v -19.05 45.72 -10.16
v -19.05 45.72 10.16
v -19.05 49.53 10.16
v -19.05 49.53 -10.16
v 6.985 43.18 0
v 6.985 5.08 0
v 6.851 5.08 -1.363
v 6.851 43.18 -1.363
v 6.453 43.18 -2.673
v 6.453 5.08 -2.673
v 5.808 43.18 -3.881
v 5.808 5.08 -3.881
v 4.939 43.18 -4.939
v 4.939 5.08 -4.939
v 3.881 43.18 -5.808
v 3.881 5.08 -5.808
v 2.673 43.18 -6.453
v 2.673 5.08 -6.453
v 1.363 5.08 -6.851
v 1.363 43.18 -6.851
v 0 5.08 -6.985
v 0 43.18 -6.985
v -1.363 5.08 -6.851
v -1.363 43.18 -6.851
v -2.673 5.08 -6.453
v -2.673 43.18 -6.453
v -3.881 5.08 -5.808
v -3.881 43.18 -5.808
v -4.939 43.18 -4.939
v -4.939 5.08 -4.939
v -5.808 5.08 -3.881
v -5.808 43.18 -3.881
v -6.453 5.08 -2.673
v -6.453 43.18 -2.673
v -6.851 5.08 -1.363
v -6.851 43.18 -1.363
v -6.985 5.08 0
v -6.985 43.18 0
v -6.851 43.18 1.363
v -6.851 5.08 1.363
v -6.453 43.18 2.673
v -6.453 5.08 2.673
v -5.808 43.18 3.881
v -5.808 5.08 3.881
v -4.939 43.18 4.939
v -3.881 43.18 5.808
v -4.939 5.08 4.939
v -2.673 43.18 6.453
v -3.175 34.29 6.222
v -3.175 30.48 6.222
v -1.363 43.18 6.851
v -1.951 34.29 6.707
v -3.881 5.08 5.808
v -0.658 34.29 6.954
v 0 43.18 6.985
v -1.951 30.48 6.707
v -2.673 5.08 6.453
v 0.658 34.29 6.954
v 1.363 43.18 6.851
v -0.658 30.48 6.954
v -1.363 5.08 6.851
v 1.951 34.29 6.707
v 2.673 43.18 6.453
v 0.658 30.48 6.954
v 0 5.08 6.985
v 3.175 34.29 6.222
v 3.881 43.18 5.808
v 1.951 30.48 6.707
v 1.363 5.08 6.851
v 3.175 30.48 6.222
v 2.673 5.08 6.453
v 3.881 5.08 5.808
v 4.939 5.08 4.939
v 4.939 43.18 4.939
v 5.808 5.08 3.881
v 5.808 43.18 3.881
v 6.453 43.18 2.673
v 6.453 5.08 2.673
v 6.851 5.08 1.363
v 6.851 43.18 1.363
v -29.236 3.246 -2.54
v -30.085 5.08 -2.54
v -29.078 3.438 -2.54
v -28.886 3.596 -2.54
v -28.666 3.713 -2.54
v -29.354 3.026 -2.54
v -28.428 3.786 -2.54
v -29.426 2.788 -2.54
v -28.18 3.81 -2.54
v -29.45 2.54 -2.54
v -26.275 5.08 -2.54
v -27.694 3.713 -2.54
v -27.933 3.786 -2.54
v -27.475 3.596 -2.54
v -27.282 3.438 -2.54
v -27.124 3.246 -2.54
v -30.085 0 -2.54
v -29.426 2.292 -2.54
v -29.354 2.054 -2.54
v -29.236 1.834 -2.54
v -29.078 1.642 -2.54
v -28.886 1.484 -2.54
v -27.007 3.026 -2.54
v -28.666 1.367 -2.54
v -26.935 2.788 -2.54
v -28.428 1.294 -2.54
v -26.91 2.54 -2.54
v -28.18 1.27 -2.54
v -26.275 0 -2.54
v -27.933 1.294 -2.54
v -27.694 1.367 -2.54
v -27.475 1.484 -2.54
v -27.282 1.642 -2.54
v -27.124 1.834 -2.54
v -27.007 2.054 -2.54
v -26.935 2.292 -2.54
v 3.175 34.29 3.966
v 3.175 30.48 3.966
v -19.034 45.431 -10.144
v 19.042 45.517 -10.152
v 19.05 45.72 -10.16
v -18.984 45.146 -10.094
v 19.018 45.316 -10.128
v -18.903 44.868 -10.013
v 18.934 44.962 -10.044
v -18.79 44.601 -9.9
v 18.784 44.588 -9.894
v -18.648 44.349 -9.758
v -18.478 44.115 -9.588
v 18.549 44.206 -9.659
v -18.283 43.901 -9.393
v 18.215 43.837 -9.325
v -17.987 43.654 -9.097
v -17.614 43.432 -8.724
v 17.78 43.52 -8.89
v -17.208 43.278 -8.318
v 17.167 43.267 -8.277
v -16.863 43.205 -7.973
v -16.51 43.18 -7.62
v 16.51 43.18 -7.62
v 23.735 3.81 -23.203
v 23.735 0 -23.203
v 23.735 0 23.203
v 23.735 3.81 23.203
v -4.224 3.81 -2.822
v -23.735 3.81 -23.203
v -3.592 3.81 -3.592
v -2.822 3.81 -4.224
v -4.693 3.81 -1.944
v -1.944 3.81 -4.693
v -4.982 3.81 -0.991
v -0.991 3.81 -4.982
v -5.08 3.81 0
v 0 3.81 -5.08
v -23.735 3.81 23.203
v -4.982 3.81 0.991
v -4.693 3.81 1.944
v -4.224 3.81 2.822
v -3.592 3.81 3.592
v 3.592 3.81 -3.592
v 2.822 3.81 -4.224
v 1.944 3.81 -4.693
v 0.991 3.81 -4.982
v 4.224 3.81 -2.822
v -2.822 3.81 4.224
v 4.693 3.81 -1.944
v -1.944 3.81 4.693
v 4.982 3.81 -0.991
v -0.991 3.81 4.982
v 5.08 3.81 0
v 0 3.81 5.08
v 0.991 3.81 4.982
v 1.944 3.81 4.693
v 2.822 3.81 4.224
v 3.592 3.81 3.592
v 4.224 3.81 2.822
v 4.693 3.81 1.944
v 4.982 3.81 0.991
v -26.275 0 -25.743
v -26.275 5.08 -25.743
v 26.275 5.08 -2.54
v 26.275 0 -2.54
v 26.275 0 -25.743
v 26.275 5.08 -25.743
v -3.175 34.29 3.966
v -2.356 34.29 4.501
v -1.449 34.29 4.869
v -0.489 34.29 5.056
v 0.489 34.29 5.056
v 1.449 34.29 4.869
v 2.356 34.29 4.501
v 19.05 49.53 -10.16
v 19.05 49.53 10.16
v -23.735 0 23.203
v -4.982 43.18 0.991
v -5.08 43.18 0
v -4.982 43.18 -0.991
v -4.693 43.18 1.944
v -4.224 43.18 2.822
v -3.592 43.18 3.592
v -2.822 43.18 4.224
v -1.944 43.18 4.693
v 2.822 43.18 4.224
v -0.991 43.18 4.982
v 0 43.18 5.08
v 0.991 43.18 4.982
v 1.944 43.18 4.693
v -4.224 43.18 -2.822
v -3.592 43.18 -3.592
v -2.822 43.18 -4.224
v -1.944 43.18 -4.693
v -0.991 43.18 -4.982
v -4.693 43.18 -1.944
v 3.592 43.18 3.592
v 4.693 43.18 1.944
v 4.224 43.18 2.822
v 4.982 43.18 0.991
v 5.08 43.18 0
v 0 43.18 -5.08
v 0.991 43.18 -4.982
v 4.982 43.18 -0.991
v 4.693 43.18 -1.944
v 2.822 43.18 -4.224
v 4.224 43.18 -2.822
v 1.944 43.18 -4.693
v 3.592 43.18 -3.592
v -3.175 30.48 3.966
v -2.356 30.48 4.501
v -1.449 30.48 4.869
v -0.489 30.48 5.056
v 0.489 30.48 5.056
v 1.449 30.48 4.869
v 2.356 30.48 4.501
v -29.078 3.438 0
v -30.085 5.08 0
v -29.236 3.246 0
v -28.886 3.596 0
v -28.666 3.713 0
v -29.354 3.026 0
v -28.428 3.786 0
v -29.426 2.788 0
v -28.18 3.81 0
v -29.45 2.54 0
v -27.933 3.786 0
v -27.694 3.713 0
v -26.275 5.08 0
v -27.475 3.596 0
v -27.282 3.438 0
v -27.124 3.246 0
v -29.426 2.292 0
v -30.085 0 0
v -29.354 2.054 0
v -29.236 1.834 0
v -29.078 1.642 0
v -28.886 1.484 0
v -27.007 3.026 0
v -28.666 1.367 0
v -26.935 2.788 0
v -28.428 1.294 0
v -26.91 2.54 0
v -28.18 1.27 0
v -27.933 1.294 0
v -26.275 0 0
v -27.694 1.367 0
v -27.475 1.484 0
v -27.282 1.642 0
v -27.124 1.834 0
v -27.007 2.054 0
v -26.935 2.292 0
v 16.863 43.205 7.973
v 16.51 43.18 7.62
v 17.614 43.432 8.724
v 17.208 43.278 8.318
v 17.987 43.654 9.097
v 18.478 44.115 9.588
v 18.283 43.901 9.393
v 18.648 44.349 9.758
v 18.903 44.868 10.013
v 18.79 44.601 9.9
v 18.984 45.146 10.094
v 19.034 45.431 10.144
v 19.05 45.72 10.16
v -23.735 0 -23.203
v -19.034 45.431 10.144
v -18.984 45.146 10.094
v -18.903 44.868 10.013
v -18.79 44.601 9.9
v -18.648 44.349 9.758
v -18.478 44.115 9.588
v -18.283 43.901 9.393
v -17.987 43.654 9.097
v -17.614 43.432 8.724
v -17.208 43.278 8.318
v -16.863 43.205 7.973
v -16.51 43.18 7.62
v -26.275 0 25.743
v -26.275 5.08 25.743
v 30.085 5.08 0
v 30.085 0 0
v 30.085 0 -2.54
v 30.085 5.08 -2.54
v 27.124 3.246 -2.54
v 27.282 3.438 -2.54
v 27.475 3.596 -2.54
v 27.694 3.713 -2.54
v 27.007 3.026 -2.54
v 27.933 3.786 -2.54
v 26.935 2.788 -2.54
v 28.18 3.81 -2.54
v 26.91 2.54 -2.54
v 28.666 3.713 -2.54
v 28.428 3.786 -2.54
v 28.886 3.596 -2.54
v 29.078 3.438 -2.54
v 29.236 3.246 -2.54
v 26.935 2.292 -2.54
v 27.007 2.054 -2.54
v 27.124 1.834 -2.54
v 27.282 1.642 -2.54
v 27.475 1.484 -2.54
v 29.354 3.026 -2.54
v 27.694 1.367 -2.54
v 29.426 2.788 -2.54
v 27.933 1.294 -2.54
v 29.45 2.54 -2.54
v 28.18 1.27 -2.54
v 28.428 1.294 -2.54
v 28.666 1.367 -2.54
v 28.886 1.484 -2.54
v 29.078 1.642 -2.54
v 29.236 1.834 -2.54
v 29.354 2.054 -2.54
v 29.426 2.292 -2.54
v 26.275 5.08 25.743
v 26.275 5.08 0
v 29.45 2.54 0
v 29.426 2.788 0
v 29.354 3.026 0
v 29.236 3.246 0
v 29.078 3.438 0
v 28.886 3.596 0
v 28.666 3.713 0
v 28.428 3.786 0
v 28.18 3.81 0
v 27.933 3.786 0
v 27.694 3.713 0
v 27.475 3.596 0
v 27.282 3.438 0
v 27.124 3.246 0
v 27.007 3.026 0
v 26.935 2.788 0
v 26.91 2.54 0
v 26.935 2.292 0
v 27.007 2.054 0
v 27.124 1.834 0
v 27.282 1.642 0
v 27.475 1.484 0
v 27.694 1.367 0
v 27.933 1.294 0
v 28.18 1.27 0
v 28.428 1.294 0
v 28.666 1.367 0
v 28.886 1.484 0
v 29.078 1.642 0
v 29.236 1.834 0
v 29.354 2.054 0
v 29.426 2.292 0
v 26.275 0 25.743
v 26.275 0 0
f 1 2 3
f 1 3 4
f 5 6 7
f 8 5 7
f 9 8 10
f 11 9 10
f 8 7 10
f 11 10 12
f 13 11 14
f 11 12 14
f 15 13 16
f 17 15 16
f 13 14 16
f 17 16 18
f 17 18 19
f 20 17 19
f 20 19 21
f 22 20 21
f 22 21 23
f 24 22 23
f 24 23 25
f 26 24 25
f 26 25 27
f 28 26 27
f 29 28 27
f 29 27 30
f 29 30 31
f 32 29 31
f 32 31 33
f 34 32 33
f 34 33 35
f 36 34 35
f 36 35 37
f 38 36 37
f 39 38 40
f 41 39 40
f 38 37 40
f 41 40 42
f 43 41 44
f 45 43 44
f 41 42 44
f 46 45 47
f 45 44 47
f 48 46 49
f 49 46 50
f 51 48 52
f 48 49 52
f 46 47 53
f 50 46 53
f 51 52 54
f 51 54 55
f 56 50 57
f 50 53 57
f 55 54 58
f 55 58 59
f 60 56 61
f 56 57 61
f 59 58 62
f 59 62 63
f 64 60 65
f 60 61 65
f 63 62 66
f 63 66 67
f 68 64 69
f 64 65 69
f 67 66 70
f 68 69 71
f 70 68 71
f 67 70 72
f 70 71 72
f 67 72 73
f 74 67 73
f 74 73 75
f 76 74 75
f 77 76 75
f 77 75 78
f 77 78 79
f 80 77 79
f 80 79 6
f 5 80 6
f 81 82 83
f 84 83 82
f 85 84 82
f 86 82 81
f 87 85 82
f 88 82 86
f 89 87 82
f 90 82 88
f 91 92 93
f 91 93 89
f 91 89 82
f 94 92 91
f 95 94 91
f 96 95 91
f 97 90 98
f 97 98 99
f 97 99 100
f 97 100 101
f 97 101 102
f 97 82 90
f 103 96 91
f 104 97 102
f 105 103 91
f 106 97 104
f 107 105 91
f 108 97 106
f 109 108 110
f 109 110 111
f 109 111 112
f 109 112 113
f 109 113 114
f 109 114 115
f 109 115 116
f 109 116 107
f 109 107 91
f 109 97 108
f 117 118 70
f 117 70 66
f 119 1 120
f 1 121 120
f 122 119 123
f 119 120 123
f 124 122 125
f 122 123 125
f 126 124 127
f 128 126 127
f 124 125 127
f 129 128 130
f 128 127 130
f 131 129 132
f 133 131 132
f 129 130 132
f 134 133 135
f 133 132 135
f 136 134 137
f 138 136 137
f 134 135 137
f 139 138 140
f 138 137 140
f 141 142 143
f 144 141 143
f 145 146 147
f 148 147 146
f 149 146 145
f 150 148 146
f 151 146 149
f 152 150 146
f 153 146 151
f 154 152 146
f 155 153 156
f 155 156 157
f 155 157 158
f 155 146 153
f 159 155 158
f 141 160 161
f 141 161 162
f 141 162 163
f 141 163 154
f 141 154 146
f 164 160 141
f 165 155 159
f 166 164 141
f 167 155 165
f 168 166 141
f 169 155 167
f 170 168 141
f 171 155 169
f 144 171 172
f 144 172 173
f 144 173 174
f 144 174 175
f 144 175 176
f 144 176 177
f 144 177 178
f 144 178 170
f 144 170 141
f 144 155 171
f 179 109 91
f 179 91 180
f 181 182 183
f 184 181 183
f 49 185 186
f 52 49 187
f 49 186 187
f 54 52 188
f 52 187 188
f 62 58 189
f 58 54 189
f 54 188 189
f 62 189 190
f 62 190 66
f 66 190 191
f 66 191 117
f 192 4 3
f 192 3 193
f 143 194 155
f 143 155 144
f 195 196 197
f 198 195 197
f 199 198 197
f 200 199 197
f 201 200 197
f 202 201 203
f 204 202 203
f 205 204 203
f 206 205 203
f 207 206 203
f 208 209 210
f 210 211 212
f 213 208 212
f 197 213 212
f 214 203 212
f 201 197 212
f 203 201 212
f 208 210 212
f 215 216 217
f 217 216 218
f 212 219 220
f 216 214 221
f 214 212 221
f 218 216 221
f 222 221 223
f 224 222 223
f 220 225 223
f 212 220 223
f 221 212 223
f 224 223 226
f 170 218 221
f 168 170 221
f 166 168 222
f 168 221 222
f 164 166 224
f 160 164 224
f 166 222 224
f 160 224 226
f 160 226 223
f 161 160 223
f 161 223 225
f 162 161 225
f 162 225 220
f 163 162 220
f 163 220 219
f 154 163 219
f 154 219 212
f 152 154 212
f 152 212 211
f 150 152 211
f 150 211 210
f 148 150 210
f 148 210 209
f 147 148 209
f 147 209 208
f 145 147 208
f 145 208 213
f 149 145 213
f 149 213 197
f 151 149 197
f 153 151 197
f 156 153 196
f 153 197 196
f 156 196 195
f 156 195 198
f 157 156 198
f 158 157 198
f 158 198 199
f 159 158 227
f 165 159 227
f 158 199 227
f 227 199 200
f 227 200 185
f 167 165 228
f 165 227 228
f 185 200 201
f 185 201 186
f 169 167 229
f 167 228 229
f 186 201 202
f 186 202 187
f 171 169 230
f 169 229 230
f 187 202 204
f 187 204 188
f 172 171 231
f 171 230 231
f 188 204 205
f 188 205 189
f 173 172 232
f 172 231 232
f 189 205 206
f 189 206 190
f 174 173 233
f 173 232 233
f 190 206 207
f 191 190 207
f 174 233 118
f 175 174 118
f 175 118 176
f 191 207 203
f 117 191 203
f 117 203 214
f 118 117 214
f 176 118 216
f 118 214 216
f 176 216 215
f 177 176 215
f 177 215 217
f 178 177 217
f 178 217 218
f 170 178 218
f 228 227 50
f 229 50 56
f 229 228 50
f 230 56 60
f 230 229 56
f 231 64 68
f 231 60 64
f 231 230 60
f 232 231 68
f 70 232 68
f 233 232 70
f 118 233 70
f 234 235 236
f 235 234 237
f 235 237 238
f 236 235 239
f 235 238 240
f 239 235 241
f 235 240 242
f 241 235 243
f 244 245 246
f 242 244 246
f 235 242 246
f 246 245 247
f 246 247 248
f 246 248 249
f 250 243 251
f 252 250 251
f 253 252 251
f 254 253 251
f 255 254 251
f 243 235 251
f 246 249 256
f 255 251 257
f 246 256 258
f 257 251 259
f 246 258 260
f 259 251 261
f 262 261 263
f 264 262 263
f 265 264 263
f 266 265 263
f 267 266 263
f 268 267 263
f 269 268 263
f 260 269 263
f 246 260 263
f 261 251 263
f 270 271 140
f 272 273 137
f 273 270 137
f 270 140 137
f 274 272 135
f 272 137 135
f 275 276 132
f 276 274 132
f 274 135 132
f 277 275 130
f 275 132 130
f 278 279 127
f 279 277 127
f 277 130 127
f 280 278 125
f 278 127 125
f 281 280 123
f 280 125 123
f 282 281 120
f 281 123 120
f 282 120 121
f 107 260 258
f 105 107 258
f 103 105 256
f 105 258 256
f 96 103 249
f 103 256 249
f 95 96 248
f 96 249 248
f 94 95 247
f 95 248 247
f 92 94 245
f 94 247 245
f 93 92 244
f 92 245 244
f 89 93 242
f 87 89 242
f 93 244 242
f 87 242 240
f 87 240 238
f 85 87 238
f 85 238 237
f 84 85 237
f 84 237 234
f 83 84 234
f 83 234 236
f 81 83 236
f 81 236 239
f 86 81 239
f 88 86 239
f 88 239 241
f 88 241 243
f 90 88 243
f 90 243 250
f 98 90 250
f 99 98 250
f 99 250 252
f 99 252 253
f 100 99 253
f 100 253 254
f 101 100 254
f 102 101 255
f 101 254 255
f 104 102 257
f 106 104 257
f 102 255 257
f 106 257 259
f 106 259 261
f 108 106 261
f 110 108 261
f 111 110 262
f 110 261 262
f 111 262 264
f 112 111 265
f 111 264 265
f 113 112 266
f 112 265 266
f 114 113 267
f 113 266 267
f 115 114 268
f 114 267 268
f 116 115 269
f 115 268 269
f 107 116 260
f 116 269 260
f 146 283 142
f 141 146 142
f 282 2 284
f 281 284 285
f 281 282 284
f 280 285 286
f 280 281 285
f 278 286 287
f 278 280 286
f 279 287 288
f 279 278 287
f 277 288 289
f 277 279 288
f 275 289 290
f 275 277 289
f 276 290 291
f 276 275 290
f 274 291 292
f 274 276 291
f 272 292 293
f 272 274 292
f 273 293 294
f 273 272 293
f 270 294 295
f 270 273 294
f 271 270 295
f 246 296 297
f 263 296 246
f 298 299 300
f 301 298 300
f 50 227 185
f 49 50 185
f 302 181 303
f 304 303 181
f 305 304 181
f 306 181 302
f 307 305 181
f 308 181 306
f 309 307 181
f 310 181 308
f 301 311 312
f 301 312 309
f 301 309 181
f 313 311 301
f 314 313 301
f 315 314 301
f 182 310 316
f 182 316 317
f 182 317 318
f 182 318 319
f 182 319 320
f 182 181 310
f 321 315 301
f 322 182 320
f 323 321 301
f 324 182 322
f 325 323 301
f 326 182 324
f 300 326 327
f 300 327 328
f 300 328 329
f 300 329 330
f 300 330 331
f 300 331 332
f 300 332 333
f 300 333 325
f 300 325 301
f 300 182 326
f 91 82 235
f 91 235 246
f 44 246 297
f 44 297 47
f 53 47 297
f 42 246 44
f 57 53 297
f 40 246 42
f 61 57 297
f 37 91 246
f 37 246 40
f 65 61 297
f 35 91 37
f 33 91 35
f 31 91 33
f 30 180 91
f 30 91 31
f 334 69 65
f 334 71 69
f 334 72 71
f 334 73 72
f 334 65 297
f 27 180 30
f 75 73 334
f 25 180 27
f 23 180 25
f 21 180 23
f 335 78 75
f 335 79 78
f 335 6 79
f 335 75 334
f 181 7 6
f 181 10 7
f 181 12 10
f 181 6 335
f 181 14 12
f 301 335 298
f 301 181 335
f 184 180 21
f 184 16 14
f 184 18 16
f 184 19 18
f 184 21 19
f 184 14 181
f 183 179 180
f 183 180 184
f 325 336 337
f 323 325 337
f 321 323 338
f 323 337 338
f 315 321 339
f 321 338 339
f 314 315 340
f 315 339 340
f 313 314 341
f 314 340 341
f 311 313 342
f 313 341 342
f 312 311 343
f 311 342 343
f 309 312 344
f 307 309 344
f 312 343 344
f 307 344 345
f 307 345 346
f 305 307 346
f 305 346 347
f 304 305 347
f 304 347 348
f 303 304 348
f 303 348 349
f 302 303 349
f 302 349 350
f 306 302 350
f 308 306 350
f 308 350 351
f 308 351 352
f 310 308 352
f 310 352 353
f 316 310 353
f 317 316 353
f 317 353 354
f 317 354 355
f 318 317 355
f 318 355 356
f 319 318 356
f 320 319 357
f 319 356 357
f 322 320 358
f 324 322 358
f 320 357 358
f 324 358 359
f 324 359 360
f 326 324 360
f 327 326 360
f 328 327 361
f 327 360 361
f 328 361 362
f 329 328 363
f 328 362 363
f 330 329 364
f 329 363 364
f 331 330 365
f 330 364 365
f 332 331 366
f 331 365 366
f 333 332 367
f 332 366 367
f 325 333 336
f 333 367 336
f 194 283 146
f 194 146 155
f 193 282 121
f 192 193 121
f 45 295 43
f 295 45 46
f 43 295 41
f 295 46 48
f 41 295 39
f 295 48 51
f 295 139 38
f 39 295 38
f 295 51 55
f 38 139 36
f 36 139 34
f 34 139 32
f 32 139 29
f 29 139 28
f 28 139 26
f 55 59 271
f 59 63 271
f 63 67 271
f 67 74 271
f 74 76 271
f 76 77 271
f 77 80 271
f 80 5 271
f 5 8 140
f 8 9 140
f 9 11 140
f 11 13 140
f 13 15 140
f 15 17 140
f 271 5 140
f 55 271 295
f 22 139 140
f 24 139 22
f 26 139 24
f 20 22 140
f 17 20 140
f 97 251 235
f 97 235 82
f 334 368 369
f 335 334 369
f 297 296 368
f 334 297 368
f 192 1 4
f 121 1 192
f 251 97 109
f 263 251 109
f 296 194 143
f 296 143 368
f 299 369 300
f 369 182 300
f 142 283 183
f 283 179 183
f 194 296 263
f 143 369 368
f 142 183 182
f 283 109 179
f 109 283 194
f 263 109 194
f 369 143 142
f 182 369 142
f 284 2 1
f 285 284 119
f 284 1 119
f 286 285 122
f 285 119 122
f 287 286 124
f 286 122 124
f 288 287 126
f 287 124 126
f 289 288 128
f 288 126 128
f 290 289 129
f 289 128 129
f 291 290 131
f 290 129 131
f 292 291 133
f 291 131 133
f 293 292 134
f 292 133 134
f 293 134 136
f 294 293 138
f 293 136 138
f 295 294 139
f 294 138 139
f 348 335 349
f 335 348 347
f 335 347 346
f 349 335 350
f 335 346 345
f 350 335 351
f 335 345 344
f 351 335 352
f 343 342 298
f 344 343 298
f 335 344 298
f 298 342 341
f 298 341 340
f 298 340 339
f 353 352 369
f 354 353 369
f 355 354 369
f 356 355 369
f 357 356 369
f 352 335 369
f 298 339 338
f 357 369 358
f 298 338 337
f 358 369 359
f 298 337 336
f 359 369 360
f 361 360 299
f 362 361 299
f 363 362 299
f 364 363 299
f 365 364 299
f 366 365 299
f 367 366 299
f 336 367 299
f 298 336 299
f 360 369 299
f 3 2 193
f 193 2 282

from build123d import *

# Parameters (mm, degrees)
SKETCH2_W           = 52.5507204
SKETCH2_H           = 51.48598542
SKETCH2_W_2         = 3.81
SKETCH2_H_2         = 2.54
BOSS_EXTRUDE1_DEPTH = 5.08
SKETCH3_W           = 47.4707204
SKETCH3_H           = 46.40598542
CUT_EXTRUDE1_DEPTH  = 3.81
SKETCH4_R           = 1.27
CUT_EXTRUDE2_DEPTH  = 3.302
SKETCH5_R           = 5.08
CUT_EXTRUDE3_DEPTH  = 1.9304
SKETCH6_R           = 6.985
BOSS_EXTRUDE2_DEPTH = 38.1
SKETCH8_R           = 5.08
CUT_EXTRUDE4_DEPTH  = 38.1
SKETCH7_W           = 38.1
SKETCH7_H           = 20.32
BOSS_EXTRUDE3_DEPTH = 6.35
FILLET3_R           = 2.54
SKETCH9_W           = 6.35
SKETCH9_H           = 3.81
CUT_EXTRUDE5_DEPTH  = 11.938


with BuildPart() as part:
    # Sketch2 → Boss-Extrude1 (new body)
    with BuildSketch(Plane(origin=(0, 0, 0), x_dir=(1, 0, 0), z_dir=(0, 1, 0))):
        with Locations((0, 3.81e-06)):
            Rectangle(SKETCH2_W, SKETCH2_H)
        with Locations((28.1803602, 1.27)):
            Rectangle(SKETCH2_W_2, SKETCH2_H_2)
        with Locations((-28.1803602, 1.2700127)):
            Rectangle(SKETCH2_W_2, SKETCH2_H_2)
    extrude(amount=BOSS_EXTRUDE1_DEPTH)

    # Sketch3 → Cut-Extrude1 (cut)
    with BuildSketch(Plane.XZ):
        with Locations((0, -3.81e-06)):
            Rectangle(SKETCH3_W, SKETCH3_H)
    extrude(amount=-CUT_EXTRUDE1_DEPTH, mode=Mode.SUBTRACT)

    # Sketch4 → Cut-Extrude2 (cut)
    with BuildSketch(Plane.XY):
        with Locations((28.1803602, 2.54)):
            Circle(SKETCH4_R)
        with Locations((-28.1803602, 2.54)):
            Circle(SKETCH4_R)
    extrude(amount=-CUT_EXTRUDE2_DEPTH, mode=Mode.SUBTRACT)

    # Sketch5 → Cut-Extrude3 (cut)
    with BuildSketch(Plane(origin=(0, 5.08, 0), x_dir=(1, 0, 0), z_dir=(0, 1, 0))):
        Circle(SKETCH5_R)
    extrude(amount=-CUT_EXTRUDE3_DEPTH, mode=Mode.SUBTRACT)

    # Sketch6 → Boss-Extrude2 (add)
    with BuildSketch(Plane(origin=(0, 5.08, 0), x_dir=(1, 0, 0), z_dir=(0, 1, 0))):
        Circle(SKETCH6_R)
    extrude(amount=BOSS_EXTRUDE2_DEPTH)

    # Sketch8 → Cut-Extrude4 (cut)
    with BuildSketch(Plane(origin=(0, 43.18, 0), x_dir=(1, 0, 0), z_dir=(0, 1, 0))):
        Circle(SKETCH8_R)
    extrude(amount=-CUT_EXTRUDE4_DEPTH, mode=Mode.SUBTRACT)

    # Sketch7 → Boss-Extrude3 (add)
    with BuildSketch(Plane(origin=(0, 43.18, 0), x_dir=(1, 0, 0), z_dir=(0, 1, 0))):
        Rectangle(SKETCH7_W, SKETCH7_H)
    extrude(amount=BOSS_EXTRUDE3_DEPTH)

    # Fillet3
    fillet3_edges = [part.edges().sort_by_distance(p)[0] for p in [
        (-19.05, 43.18, 0),
        (0, 43.18, 10.16),
        (19.05, 43.18, 0),
        (0, 43.18, -10.16),
    ]]
    fillet(fillet3_edges, radius=FILLET3_R)

    # Sketch9 → Cut-Extrude5 (cut)
    with BuildSketch(Plane.XY.offset(0.3429889)):
        with Locations((0, 32.385)):
            Rectangle(SKETCH9_W, SKETCH9_H)
    extrude(amount=CUT_EXTRUDE5_DEPTH, mode=Mode.SUBTRACT)


solid = part.part
